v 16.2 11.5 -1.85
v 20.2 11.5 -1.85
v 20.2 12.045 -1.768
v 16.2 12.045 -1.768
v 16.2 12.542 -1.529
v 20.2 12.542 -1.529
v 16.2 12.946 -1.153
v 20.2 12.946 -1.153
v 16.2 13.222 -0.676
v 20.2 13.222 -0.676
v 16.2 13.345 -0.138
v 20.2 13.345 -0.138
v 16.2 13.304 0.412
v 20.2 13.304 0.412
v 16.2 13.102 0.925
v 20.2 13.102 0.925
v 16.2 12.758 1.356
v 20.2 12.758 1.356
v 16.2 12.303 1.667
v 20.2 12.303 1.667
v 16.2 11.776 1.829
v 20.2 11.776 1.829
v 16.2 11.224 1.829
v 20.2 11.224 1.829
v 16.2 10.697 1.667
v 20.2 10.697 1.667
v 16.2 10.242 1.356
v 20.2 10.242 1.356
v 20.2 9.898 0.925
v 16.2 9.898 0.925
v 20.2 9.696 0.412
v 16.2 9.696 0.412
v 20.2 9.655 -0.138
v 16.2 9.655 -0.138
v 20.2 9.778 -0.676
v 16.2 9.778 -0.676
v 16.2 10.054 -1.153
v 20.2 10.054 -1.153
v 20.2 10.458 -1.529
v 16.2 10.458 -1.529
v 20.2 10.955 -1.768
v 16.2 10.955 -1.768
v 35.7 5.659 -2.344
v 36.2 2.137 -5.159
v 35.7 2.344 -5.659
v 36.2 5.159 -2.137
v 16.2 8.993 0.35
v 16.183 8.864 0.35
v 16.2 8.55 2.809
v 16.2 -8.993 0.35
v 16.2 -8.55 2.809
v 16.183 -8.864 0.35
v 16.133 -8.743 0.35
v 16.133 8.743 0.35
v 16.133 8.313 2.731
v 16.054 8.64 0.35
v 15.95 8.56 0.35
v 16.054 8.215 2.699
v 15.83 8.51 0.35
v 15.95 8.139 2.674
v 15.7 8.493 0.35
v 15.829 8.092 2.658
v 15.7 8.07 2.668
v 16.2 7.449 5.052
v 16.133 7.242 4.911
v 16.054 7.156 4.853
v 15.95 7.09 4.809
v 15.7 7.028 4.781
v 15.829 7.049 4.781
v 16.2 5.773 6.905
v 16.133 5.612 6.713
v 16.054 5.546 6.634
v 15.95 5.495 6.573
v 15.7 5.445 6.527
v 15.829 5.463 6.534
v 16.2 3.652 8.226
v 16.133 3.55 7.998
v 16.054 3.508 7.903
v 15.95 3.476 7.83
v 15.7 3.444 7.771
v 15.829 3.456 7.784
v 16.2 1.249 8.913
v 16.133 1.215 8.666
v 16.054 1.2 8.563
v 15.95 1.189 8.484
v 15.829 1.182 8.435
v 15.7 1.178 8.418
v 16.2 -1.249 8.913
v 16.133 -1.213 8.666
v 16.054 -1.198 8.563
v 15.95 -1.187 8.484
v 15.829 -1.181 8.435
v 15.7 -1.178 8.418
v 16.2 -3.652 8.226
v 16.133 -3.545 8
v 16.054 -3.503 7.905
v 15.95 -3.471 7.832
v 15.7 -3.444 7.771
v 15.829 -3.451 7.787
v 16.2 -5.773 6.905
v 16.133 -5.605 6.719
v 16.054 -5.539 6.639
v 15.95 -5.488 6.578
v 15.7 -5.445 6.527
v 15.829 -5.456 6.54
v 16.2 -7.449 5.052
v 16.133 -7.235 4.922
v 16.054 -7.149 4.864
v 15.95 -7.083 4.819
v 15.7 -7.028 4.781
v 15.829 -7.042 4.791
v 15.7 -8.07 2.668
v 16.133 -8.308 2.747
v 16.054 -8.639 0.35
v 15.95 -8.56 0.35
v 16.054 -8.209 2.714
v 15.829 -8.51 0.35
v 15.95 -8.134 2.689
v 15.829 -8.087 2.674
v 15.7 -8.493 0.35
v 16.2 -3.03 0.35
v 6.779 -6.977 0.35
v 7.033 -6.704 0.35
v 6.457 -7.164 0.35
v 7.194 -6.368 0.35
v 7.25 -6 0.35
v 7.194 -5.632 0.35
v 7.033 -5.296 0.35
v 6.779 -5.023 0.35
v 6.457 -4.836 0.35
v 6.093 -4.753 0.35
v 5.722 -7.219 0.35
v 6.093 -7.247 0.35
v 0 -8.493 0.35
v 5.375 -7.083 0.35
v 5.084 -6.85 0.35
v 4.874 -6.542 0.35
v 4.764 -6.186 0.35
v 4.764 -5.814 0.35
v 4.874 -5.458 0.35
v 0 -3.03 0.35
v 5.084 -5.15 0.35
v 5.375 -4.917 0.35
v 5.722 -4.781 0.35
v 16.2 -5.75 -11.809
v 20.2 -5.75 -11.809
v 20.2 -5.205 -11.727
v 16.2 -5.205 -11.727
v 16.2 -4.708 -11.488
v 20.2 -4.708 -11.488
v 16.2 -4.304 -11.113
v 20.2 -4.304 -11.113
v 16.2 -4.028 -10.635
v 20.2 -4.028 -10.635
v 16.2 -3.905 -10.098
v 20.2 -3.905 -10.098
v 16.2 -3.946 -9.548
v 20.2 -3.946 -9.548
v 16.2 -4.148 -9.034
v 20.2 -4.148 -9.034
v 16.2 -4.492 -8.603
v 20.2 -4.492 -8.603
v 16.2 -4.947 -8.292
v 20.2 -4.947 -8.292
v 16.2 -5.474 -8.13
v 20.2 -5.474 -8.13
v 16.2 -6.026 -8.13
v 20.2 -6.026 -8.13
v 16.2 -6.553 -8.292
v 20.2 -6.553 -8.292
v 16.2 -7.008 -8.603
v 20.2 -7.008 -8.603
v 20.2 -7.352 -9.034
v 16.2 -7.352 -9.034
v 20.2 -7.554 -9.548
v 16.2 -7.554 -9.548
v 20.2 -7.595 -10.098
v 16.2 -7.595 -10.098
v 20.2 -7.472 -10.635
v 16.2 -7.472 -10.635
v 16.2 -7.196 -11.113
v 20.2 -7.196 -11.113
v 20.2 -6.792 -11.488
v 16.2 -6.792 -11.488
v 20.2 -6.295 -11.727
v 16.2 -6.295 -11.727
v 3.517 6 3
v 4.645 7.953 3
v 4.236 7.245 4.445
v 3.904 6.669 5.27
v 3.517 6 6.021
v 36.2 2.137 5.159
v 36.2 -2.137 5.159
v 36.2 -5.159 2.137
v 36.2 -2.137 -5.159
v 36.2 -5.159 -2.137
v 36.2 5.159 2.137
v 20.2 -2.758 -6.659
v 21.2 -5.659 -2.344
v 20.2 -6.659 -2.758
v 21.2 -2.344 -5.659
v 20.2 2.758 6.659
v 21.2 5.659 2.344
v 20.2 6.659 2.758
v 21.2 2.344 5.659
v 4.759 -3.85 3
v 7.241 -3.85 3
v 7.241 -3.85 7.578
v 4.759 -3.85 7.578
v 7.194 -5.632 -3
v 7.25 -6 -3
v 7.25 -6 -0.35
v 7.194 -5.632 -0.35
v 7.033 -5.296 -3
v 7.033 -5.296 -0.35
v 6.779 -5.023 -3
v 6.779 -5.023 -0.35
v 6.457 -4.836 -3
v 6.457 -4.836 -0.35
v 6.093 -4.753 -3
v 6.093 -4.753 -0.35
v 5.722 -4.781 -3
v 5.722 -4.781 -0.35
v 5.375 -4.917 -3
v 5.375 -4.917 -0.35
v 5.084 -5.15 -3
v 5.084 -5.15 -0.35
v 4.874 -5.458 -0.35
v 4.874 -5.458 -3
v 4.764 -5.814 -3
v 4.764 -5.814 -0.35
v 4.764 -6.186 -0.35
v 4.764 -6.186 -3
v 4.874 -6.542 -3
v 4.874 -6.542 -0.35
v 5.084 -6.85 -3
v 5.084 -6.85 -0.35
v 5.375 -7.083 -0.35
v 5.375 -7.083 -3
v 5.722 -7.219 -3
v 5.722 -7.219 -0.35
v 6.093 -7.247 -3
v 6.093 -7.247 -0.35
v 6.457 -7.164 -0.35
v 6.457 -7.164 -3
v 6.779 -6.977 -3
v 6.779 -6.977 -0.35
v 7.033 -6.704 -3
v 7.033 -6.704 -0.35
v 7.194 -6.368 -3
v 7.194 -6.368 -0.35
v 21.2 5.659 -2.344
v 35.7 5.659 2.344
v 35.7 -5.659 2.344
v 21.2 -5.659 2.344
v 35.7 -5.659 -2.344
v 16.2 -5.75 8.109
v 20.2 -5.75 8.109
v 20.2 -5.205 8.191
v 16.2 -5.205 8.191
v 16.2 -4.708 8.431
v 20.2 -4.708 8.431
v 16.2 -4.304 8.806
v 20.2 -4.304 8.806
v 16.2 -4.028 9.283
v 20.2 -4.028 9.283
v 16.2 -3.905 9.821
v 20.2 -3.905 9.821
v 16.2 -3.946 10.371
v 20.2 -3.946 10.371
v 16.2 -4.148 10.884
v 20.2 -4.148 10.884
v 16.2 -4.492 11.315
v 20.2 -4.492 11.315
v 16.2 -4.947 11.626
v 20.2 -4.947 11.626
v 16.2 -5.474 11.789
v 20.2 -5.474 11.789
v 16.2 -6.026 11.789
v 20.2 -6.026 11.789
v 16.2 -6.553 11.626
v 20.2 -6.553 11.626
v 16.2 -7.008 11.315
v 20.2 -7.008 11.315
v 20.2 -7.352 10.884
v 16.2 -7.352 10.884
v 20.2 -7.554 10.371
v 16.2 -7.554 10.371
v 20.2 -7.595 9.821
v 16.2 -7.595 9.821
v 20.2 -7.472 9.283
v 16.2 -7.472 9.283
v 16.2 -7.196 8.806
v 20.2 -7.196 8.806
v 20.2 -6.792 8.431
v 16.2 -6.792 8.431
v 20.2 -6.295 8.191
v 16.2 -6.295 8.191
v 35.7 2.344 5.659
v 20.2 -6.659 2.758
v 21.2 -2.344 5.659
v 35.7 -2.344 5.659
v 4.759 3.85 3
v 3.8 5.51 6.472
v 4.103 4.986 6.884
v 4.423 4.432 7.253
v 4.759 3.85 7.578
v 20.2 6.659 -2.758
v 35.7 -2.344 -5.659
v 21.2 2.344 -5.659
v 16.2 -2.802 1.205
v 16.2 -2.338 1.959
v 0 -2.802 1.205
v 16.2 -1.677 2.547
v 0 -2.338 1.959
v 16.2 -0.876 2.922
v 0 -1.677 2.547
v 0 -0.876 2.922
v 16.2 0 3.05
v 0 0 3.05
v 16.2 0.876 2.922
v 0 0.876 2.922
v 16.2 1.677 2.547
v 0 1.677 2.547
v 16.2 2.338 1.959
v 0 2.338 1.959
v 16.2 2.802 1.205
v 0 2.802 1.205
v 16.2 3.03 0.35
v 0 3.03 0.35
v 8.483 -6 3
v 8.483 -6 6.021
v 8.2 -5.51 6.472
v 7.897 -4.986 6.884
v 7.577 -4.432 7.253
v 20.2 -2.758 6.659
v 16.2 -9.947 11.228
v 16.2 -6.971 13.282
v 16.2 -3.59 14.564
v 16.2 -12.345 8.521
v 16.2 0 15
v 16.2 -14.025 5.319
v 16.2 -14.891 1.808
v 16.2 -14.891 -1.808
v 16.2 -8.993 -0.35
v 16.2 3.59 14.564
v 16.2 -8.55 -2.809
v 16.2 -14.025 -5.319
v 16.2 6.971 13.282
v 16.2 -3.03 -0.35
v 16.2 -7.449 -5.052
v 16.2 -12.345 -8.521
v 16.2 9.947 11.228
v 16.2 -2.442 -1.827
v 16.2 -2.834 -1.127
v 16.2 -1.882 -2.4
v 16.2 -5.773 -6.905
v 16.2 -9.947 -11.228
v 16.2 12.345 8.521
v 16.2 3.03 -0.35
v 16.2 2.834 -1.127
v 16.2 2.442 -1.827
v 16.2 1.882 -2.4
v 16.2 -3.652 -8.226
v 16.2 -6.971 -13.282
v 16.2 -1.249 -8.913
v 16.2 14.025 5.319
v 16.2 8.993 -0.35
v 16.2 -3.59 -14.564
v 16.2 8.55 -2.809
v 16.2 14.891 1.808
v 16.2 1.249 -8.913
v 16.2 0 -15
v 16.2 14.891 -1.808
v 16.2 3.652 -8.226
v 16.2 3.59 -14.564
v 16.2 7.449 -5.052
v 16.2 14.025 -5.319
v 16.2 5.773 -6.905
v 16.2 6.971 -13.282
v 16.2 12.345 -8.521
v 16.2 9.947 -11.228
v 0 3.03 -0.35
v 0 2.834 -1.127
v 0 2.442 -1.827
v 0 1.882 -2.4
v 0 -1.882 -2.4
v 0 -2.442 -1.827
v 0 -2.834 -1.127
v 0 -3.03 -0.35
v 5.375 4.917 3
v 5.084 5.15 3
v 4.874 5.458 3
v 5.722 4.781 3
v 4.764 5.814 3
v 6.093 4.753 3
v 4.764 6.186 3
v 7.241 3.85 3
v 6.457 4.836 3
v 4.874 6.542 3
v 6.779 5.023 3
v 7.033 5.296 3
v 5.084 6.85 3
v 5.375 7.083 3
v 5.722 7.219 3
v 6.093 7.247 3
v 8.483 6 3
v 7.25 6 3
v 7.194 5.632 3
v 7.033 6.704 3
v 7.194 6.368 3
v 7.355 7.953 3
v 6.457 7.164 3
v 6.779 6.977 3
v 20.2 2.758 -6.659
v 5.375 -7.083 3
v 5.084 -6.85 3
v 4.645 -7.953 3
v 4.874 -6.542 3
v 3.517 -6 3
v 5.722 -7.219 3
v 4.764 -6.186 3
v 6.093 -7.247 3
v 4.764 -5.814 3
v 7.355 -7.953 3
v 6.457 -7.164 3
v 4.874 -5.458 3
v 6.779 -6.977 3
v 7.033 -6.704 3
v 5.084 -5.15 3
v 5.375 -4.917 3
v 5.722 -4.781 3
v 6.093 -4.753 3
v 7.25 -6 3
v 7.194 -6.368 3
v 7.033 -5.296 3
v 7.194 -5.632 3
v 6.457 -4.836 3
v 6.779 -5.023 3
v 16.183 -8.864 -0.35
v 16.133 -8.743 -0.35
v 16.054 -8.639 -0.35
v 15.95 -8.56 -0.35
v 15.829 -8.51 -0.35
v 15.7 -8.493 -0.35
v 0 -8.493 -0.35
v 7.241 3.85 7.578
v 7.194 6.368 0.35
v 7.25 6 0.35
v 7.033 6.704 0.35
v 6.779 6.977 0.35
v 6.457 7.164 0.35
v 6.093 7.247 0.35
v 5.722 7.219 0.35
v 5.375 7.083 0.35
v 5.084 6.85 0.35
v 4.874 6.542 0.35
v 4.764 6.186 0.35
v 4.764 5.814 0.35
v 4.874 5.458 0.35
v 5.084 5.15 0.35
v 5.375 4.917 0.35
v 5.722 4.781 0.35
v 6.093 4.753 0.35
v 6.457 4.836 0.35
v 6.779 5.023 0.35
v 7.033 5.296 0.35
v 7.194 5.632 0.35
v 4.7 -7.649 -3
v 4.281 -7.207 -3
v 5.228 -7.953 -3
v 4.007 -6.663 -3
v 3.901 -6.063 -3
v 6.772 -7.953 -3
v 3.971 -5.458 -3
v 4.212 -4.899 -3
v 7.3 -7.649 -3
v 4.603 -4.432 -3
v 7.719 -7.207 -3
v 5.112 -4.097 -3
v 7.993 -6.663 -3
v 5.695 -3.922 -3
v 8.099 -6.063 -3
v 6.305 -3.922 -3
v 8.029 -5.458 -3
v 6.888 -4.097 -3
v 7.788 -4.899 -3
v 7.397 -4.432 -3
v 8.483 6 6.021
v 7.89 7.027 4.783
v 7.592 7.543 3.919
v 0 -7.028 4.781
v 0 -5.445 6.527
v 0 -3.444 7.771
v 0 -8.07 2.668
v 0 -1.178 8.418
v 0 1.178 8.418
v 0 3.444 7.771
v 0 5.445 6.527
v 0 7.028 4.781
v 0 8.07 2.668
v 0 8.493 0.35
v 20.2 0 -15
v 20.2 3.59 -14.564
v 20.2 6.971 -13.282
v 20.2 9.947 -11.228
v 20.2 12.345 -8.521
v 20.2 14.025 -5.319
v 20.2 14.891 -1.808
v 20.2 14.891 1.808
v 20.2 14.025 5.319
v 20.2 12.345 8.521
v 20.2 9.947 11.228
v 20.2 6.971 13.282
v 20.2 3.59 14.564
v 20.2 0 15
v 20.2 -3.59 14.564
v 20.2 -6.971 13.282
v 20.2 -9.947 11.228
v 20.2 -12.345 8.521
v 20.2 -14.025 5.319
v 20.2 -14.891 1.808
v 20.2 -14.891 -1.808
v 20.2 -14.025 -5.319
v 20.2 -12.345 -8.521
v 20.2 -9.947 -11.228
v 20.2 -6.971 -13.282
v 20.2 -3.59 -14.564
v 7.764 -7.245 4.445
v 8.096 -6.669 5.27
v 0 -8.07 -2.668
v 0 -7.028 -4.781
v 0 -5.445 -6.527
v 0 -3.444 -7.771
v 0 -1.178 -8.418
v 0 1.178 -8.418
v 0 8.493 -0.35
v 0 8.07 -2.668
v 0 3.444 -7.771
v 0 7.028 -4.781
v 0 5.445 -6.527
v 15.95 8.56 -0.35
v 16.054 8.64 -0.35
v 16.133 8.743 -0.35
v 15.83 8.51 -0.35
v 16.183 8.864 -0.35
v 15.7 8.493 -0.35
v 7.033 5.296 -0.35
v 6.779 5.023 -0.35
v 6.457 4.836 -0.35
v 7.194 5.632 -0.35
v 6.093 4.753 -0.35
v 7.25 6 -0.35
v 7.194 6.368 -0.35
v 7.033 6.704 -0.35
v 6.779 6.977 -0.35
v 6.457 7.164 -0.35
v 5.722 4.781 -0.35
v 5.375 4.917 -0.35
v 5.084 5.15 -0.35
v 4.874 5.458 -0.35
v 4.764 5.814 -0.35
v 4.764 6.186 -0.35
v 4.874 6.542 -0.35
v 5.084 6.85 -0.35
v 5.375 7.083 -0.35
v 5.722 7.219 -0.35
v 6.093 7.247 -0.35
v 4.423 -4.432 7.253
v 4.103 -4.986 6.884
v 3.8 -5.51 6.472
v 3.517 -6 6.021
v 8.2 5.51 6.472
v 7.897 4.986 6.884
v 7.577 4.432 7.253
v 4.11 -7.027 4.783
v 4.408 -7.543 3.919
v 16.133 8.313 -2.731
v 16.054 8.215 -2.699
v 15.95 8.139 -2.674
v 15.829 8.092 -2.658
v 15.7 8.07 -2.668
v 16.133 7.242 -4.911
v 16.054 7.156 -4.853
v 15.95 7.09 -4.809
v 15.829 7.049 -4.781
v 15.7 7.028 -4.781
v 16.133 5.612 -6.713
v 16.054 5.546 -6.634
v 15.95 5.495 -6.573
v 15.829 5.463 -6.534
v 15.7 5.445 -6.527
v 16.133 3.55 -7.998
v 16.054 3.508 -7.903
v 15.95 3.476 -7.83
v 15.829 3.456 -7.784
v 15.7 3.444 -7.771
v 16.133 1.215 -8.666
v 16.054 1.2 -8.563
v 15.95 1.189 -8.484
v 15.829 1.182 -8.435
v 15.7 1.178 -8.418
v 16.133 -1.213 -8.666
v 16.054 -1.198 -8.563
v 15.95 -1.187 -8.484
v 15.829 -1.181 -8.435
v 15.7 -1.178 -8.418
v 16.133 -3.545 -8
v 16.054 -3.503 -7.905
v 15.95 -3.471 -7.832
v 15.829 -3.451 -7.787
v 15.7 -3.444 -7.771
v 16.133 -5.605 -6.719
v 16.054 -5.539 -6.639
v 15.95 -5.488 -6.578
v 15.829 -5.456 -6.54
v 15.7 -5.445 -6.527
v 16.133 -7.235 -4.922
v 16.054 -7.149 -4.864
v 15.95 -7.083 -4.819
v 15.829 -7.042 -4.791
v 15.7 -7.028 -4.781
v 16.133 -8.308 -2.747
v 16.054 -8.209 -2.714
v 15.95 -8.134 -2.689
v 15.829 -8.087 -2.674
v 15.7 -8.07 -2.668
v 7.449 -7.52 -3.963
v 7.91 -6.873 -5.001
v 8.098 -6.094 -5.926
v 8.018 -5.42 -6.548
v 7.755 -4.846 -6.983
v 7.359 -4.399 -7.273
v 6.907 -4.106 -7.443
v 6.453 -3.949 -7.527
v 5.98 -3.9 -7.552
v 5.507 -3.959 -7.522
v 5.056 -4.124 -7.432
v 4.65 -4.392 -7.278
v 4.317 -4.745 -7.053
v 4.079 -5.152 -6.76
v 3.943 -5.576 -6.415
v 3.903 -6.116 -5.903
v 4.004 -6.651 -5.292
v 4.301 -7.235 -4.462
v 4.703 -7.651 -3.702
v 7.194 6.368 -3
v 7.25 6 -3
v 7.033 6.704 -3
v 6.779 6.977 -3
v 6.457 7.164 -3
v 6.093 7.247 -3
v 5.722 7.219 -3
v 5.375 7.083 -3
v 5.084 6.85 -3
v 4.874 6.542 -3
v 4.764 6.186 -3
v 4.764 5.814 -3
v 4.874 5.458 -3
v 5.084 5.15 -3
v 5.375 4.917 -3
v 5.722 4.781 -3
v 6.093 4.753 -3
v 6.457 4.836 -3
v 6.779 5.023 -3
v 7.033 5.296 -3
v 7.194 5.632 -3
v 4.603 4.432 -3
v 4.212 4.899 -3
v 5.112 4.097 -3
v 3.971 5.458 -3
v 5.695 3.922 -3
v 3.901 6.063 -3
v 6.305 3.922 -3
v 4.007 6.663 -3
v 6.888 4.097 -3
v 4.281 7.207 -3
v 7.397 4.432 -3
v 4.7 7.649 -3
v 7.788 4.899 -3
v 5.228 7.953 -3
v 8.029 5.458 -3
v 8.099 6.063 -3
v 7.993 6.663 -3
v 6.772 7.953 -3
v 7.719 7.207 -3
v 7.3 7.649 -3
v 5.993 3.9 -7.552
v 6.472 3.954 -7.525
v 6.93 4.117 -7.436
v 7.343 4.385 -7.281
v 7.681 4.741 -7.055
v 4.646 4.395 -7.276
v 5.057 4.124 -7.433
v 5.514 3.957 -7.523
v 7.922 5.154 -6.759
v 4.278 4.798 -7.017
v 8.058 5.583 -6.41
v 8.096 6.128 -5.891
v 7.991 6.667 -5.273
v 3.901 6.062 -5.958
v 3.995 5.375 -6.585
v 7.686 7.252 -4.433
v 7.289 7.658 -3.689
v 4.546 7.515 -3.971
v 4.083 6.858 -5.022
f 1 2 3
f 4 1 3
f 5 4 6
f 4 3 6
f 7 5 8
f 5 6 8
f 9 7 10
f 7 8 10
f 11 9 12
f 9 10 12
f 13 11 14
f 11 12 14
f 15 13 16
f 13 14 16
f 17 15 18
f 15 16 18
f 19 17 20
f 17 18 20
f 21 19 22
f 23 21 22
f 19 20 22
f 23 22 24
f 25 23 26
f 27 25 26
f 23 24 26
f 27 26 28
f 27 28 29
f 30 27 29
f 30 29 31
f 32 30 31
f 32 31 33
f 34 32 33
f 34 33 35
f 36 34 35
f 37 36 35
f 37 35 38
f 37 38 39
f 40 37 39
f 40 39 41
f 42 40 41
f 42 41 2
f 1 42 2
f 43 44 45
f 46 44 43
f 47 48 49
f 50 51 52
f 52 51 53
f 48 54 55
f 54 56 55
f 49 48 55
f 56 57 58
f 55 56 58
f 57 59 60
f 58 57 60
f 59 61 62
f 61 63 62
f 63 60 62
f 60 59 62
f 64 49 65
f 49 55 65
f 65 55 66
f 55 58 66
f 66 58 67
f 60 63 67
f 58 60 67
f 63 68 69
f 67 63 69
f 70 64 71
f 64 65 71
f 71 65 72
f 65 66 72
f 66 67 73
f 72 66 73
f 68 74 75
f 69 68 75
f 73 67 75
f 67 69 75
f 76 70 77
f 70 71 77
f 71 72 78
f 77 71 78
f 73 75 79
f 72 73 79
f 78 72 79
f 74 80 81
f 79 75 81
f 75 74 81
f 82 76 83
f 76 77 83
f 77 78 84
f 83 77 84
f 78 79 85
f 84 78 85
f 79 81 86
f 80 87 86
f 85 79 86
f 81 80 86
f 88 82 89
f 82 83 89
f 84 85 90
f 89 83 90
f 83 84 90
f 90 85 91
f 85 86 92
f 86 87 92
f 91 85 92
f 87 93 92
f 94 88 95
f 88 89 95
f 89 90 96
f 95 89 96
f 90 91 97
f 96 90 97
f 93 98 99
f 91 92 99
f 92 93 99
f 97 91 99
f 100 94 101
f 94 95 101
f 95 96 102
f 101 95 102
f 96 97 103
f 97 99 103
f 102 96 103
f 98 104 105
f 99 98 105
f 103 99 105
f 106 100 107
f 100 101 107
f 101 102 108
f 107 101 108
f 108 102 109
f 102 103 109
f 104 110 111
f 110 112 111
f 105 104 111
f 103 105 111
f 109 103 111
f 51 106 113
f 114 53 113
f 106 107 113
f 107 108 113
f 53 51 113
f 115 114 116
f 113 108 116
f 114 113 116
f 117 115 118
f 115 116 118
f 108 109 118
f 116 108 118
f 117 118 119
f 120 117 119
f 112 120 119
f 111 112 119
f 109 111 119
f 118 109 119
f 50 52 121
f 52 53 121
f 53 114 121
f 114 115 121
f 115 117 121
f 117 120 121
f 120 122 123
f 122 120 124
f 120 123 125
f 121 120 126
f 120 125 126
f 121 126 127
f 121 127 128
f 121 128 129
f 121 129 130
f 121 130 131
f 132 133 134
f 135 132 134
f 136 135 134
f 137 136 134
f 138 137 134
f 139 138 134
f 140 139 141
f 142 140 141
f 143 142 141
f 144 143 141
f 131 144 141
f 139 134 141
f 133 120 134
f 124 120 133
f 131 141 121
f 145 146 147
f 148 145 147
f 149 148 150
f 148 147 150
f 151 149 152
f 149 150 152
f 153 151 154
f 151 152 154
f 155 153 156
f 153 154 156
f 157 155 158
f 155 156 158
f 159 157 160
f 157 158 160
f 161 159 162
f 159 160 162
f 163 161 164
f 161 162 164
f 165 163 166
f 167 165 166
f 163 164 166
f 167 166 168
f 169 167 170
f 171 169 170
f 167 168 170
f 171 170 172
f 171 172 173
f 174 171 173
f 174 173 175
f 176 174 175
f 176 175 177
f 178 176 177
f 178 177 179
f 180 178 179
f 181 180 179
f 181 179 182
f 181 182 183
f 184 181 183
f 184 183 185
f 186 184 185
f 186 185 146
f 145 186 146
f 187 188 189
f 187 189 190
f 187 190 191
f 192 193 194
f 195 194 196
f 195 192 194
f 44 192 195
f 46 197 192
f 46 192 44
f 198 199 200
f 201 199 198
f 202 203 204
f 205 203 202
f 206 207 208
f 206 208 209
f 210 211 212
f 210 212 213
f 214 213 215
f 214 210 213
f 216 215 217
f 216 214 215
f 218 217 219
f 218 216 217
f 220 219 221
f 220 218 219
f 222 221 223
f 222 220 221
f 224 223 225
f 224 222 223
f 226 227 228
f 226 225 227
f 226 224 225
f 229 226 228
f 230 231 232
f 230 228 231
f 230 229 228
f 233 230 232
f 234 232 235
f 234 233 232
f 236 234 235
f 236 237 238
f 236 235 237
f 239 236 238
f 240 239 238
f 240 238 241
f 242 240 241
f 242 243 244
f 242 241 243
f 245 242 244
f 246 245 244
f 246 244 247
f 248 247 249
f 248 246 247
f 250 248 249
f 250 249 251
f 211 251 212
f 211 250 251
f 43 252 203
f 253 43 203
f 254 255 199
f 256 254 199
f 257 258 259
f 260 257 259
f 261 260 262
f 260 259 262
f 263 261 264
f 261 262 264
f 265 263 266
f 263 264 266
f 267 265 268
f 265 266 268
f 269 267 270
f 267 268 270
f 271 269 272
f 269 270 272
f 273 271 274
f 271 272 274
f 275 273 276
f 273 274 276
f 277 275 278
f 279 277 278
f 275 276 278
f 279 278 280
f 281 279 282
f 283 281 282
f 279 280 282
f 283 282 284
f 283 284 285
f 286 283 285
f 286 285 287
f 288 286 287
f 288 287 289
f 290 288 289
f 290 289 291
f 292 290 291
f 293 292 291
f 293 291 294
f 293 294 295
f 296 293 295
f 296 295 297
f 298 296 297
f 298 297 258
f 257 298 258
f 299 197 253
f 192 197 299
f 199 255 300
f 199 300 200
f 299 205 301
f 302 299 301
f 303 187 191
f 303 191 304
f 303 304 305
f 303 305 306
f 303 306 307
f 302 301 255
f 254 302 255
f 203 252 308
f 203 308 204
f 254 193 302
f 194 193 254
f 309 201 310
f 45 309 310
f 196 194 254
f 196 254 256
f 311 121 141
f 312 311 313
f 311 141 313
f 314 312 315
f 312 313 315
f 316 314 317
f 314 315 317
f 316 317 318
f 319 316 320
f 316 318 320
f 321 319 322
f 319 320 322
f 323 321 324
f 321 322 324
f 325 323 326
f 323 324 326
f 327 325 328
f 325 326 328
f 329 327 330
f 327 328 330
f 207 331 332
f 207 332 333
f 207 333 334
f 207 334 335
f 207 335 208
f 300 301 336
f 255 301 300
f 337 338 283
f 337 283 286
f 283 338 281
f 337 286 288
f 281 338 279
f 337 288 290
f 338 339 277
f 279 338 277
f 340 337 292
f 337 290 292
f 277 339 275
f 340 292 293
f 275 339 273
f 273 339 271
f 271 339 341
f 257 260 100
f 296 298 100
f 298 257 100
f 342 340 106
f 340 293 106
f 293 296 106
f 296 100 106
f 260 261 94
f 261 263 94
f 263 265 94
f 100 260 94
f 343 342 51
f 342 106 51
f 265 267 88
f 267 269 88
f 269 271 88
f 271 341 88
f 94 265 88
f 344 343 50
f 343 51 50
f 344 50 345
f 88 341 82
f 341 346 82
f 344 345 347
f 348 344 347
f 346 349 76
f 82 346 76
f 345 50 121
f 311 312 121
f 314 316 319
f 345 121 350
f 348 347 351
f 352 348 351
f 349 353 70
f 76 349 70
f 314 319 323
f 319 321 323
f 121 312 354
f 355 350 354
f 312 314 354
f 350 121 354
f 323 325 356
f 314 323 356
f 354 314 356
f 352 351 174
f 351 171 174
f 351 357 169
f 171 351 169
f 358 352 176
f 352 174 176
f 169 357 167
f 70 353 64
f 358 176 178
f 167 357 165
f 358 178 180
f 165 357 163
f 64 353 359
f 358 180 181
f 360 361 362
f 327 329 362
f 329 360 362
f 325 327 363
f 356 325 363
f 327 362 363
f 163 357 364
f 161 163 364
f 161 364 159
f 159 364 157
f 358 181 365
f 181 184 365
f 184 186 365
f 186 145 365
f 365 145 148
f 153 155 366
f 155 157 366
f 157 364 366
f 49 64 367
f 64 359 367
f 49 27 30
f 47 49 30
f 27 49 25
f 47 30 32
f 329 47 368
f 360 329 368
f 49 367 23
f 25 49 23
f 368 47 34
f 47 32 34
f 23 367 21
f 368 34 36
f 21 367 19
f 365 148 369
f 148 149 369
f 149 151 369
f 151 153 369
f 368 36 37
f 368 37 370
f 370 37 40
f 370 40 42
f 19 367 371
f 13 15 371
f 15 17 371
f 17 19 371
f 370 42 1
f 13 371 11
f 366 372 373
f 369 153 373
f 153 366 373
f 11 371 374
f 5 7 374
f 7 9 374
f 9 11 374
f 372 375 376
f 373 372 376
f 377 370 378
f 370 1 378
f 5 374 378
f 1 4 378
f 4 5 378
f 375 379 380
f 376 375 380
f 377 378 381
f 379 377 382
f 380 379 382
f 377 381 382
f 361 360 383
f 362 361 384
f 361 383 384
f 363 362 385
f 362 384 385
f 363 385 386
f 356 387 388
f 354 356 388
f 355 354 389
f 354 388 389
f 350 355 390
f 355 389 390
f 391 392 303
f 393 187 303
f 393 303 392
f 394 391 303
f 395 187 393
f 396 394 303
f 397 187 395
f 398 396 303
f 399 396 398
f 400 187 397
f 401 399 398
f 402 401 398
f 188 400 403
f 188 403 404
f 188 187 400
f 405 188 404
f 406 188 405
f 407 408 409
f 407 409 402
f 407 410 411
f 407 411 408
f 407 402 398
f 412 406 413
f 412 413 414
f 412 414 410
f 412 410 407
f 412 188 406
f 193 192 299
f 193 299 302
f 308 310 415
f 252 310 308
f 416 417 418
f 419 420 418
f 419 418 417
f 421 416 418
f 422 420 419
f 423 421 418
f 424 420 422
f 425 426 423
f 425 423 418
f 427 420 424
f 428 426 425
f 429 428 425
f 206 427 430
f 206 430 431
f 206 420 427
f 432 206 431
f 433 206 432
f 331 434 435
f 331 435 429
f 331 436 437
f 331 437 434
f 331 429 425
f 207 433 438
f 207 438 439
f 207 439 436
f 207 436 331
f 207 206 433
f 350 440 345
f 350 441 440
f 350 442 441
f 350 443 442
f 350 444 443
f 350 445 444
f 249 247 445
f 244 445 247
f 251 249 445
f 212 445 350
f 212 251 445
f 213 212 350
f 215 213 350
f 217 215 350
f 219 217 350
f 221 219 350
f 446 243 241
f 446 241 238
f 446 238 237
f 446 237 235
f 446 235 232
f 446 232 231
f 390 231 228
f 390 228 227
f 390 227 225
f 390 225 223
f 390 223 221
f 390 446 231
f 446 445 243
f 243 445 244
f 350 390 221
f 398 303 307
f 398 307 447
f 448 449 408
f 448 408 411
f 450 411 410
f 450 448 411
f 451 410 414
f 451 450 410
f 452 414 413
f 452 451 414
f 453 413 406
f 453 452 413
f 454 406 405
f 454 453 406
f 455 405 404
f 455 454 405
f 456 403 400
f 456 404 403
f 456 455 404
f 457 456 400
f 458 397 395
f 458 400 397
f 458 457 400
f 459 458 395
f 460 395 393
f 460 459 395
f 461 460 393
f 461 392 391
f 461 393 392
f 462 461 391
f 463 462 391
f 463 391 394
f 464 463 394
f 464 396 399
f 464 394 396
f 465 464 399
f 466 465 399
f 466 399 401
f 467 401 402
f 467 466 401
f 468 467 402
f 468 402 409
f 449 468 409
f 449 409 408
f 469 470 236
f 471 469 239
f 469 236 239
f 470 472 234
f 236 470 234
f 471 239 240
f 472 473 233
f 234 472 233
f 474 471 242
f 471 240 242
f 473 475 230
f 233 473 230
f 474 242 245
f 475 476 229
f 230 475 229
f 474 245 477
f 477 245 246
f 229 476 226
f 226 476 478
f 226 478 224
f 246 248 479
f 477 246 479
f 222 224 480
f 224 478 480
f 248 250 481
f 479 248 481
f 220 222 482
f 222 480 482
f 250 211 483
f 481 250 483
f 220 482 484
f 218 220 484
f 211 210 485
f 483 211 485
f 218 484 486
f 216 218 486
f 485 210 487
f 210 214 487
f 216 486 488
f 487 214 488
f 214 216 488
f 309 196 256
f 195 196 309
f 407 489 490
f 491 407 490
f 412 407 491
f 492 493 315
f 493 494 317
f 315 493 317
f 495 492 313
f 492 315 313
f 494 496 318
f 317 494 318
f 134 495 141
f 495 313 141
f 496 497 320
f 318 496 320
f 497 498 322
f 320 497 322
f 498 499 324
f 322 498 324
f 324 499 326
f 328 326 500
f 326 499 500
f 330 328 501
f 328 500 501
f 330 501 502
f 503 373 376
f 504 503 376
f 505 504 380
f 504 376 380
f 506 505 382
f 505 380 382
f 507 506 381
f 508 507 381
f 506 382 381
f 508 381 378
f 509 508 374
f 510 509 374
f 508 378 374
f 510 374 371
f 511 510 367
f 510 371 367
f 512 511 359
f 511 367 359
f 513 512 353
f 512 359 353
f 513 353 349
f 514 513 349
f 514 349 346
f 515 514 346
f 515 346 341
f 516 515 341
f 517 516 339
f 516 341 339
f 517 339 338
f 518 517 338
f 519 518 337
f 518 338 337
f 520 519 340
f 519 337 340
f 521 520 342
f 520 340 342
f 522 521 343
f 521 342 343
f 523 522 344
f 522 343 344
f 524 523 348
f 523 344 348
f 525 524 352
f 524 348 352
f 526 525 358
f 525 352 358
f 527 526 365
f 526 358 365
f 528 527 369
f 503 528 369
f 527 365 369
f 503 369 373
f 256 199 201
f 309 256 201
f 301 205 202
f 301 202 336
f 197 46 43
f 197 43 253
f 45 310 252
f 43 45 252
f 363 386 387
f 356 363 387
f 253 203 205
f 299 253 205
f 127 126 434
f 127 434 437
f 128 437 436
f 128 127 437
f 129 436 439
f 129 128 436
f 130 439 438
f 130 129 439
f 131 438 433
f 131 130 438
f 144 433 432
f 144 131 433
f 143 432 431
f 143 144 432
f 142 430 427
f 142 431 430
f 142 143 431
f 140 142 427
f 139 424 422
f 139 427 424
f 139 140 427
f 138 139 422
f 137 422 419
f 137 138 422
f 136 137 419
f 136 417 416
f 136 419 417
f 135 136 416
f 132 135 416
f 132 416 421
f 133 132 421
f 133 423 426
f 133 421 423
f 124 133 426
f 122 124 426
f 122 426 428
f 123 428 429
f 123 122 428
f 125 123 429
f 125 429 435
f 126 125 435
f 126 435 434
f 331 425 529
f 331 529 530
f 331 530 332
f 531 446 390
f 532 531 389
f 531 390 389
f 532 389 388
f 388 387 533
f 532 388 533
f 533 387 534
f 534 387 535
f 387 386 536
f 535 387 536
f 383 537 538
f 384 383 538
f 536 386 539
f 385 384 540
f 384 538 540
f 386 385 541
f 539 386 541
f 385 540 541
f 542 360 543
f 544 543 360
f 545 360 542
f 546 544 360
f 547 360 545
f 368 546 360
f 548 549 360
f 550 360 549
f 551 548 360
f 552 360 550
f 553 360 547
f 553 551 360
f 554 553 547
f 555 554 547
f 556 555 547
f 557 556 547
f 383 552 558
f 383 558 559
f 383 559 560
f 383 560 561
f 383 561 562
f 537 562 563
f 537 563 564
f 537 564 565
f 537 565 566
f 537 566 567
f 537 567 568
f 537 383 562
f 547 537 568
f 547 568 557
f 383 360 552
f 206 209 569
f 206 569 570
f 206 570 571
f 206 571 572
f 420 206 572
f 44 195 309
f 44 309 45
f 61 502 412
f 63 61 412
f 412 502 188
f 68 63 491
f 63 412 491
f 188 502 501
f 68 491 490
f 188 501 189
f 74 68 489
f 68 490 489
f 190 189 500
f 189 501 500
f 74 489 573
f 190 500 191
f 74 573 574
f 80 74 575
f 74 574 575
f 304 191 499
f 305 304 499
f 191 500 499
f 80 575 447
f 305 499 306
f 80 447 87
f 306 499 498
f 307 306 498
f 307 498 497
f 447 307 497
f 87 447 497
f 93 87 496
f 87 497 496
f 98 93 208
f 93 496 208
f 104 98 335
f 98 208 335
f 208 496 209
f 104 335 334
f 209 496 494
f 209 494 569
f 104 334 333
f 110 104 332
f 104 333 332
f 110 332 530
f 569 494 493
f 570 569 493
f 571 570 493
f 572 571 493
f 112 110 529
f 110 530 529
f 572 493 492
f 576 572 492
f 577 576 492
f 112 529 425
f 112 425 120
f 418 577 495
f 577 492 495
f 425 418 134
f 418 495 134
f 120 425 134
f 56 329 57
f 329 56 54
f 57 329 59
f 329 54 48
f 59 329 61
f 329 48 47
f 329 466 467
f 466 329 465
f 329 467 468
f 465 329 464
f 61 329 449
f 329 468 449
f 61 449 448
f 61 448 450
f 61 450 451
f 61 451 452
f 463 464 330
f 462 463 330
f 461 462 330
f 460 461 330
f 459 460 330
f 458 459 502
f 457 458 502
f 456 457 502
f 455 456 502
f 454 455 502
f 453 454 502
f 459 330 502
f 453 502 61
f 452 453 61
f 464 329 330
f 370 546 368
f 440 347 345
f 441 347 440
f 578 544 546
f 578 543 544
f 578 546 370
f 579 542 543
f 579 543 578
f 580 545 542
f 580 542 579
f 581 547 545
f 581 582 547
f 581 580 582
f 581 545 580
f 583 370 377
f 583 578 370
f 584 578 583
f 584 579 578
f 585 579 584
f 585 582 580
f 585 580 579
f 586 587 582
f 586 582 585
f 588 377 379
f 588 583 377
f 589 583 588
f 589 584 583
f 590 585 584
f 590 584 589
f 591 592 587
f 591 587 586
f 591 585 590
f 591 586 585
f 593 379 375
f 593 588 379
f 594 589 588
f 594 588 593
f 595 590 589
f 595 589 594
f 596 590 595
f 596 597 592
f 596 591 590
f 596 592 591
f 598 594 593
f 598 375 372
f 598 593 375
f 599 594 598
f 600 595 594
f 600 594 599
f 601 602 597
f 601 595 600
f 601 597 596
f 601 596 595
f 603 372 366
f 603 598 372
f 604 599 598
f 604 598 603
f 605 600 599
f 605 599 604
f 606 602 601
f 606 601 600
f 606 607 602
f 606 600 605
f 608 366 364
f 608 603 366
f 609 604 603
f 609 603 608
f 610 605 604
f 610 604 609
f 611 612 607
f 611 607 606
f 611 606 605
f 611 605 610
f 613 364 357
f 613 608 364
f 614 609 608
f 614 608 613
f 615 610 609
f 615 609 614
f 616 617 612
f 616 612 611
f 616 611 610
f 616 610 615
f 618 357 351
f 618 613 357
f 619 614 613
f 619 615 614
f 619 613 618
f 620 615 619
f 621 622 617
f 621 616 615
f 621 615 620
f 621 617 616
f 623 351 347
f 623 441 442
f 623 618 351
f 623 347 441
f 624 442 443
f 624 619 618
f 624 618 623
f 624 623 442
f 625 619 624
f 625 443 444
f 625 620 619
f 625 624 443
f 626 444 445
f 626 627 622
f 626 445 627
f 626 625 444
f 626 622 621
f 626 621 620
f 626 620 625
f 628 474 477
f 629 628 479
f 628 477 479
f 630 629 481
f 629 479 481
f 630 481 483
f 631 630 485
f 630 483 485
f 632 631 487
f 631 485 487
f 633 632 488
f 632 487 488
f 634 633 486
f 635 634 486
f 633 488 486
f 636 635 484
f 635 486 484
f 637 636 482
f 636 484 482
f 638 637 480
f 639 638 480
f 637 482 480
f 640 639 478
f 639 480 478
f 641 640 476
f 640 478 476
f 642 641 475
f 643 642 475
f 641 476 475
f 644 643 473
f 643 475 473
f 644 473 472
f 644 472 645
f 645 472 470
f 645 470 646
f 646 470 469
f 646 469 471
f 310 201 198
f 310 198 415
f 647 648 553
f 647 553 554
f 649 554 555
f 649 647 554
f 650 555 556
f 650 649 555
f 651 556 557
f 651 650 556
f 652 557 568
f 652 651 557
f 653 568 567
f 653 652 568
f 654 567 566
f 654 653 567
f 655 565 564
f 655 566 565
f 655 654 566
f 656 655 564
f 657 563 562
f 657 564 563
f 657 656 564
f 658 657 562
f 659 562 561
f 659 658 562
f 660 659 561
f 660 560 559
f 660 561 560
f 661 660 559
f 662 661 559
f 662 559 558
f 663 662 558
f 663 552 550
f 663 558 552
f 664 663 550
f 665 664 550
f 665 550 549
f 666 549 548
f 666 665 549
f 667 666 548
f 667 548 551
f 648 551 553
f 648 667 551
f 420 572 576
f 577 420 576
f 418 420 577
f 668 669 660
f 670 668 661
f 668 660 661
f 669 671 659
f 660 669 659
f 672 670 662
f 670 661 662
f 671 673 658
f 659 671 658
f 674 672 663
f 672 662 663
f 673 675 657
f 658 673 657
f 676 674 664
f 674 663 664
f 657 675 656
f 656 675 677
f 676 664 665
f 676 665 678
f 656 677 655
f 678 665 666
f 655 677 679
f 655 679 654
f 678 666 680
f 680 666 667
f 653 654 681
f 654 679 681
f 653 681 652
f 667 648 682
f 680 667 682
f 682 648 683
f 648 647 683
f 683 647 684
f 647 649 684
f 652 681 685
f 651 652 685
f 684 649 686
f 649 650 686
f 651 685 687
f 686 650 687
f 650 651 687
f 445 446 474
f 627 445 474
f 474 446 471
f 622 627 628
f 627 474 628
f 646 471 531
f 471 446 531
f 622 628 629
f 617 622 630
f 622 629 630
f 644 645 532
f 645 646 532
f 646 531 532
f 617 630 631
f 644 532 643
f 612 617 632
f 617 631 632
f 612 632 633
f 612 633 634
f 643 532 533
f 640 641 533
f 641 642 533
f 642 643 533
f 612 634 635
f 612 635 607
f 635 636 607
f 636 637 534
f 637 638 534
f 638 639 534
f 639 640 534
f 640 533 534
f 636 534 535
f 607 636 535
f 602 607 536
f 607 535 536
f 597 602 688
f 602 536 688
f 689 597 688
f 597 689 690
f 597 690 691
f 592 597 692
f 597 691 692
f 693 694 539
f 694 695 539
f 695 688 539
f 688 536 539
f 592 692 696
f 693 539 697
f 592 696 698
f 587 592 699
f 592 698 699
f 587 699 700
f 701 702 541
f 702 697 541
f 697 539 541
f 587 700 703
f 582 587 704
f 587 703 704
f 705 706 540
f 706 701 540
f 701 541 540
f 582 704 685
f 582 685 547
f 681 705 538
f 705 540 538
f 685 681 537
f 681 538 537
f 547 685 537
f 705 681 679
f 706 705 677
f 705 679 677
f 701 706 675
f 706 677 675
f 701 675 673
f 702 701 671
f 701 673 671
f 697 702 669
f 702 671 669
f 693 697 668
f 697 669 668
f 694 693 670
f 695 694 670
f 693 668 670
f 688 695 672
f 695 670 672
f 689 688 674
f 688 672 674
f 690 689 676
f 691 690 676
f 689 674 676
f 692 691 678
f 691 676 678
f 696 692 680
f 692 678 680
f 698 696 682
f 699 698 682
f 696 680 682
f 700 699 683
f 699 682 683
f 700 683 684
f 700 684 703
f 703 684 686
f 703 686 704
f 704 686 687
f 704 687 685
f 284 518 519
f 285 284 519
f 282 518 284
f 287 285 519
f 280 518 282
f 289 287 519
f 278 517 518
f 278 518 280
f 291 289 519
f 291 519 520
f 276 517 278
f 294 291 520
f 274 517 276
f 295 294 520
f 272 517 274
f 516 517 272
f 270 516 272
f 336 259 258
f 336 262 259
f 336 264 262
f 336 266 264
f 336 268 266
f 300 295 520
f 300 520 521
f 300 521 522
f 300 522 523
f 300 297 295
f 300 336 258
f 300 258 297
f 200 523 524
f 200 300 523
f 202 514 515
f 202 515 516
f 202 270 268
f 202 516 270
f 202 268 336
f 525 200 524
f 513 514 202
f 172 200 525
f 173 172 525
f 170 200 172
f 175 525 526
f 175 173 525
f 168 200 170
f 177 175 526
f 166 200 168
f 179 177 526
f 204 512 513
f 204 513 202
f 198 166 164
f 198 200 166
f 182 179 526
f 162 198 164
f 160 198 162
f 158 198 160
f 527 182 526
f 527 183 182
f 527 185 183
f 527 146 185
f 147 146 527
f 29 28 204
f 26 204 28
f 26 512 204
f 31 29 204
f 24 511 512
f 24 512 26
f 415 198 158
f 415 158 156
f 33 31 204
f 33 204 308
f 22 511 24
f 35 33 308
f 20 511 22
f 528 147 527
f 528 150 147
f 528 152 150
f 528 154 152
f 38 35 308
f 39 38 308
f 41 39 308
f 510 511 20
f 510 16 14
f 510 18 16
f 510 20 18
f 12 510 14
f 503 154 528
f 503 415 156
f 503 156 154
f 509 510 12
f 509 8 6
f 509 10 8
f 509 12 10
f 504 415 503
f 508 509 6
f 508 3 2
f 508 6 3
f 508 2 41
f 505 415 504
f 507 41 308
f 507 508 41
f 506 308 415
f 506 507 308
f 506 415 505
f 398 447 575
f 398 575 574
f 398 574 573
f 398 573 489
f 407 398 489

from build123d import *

# Parameters (mm, degrees)
SKETCH1_R               = 8.5
BOSS_EXTRUDE1_DEPTH     = 16.2
SKETCH4_W               = 0.7
SKETCH4_H               = 17
CUT_EXTRUDE2_DEPTH      = 21.172753902
SKETCH5_R               = 15
BOSS_EXTRUDE2_DEPTH     = 4
BOSS_EXTRUDE3_DEPTH     = 16
SKETCH7_R               = 1.85
CUT_EXTRUDE3_DEPTH      = 30.292319813
CHAMFER1_SIZE           = 0.5
CUT_EXTRUDE4_DEPTH      = 42.957597643
CUT_EXTRUDE4_DEPTH_BACK = 42.957597643
SKETCH8_R               = 1.25
CUT_EXTRUDE5_DEPTH      = 44.121224472
SKETCH10_R              = 2.1
CUT_EXTRUDE6_DEPTH      = 44.121224472
FILLET1_R               = 0.5
CHAMFER2_SIZE           = 1


with BuildPart() as part:
    # Sketch1 → Boss-Extrude1 (new body)
    with BuildSketch(Plane(origin=(0, 0, 0), x_dir=(0, 0, -1), z_dir=(1, 0, 0))):
        Circle(SKETCH1_R)
        with BuildLine():
            Line((2.4, 1.882153022), (2.4, -1.882153022))
            ThreePointArc((2.4, -1.882153022), (-3.05, 0), (2.4, 1.882153022))
        make_face(mode=Mode.SUBTRACT)
    extrude(amount=BOSS_EXTRUDE1_DEPTH)

    # Sketch4 → Cut-Extrude2 (cut, through all)
    with BuildSketch(Plane.ZY):
        Rectangle(SKETCH4_W, SKETCH4_H)
    extrude(amount=-CUT_EXTRUDE2_DEPTH, mode=Mode.SUBTRACT)


with BuildPart() as cut_extrude2_piece_1:
    # of the separate pieces the step leaves, piece 1, a body of its own (cut_extrude2_pieces)
    add(part.part.solids().sort_by_distance((0, -8.492791061, -0.35))[0])



with BuildPart() as cut_extrude2_piece_2:
    # of the separate pieces the step leaves, piece 2, a body of its own (cut_extrude2_pieces)
    add(part.part.solids().sort_by_distance((0, 3.029851482, 0.35))[0])


with BuildPart() as cut_extrude2_piece_1_1:
    add(cut_extrude2_piece_1.part)

    add(cut_extrude2_piece_2.part)  # Boss-Extrude2 merges Cut-Extrude2 piece 2
    # Sketch5 → Boss-Extrude2 (add)
    with BuildSketch(Plane(origin=(16.2, 0, 0), x_dir=(0, 0, -1), z_dir=(1, 0, 0))):
        Circle(SKETCH5_R)
    extrude(amount=BOSS_EXTRUDE2_DEPTH)

    # Sketch6 → Boss-Extrude3 (add)
    with BuildSketch(Plane(origin=(20.2, 0, 0), x_dir=(0, 0, -1), z_dir=(1, 0, 0))):
        Polygon((2.343936023, 5.658762137), (-2.343936023, 5.658762137), (-5.658762137, 2.343936023), (-5.658762137, -2.343936023), (-2.343936023, -5.658762137), (2.343936023, -5.658762137), (5.658762137, -2.343936023), (5.658762137, 2.343936023), align=None)
    extrude(amount=BOSS_EXTRUDE3_DEPTH)

    # Sketch7 → Cut-Extrude3 (cut, through all)
    with BuildSketch(Plane(origin=(20.2, 0, 0), x_dir=(0, 0, -1), z_dir=(1, 0, 0))):
        with Locations((0, 11.5)):
            Circle(SKETCH7_R)
        with Locations((-9.959292144, -5.75)):
            Circle(SKETCH7_R)
        with Locations((9.959292144, -5.75)):
            Circle(SKETCH7_R)
    extrude(amount=-CUT_EXTRUDE3_DEPTH, mode=Mode.SUBTRACT)

    # Chamfer1
    chamfer1_edges = [cut_extrude2_piece_1_1.edges().sort_by_distance(p)[0] for p in [
        (36.2, 4.00134908, -4.00134908),
        (36.2, 5.658762137, 0),
        (36.2, 4.00134908, 4.00134908),
        (36.2, 0, 5.658762137),
        (36.2, -4.00134908, 4.00134908),
        (36.2, -5.658762137, 0),
        (36.2, -4.00134908, -4.00134908),
        (36.2, 0, -5.658762137),
    ]]
    chamfer(chamfer1_edges, length=CHAMFER1_SIZE)

    # Sketch8 → Cut-Extrude4 (cut, two sides: drawn at the far end of the back side and taken through both)
    with BuildSketch(Plane.XY.offset(-CUT_EXTRUDE4_DEPTH_BACK)):
        with Locations((6, 6)):
            Circle(SKETCH8_R)
        with Locations((6, -6)):
            Circle(SKETCH8_R)
    extrude(amount=CUT_EXTRUDE4_DEPTH + CUT_EXTRUDE4_DEPTH_BACK, mode=Mode.SUBTRACT)

    # Sketch9 → Cut-Extrude5 (cut, through all)
    with BuildSketch(Plane.XY.offset(3)):
        Polygon((7.241303079, 3.85), (8.482606158, 6), (7.241303079, 8.15), (4.758696921, 8.15), (3.517393842, 6), (4.758696921, 3.85), align=None)
        Polygon((7.241303079, -8.15), (8.482606158, -6), (7.241303079, -3.85), (4.758696921, -3.85), (3.517393842, -6), (4.758696921, -8.15), align=None)
    extrude(amount=CUT_EXTRUDE5_DEPTH, mode=Mode.SUBTRACT)

    # Sketch10 → Cut-Extrude6 (cut, through all)
    with BuildSketch(Plane.XY.offset(-3)):
        with Locations((6, 6)):
            Circle(SKETCH10_R)
        with Locations((6, -6)):
            Circle(SKETCH10_R)
    extrude(amount=-CUT_EXTRUDE6_DEPTH, mode=Mode.SUBTRACT)

    # Fillet1
    fillet1_edges = [cut_extrude2_piece_1_1.edges().sort_by_distance(p)[0] for p in [
        (16.2, 0, 8.5),
        (16.2, 0, -8.5),
    ]]
    fillet(fillet1_edges, radius=FILLET1_R)

    # Chamfer2
    chamfer2_edges = [cut_extrude2_piece_1_1.edges().sort_by_distance(p)[0] for p in [
        (20.2, 4.00134908, -4.00134908),
        (20.2, 5.658762137, 0),
        (20.2, 4.00134908, 4.00134908),
        (20.2, 0, 5.658762137),
        (20.2, -4.00134908, 4.00134908),
        (20.2, -5.658762137, 0),
        (20.2, -4.00134908, -4.00134908),
        (20.2, 0, -5.658762137),
    ]]
    chamfer(chamfer2_edges, length=CHAMFER2_SIZE)


solid = cut_extrude2_piece_1_1.part
